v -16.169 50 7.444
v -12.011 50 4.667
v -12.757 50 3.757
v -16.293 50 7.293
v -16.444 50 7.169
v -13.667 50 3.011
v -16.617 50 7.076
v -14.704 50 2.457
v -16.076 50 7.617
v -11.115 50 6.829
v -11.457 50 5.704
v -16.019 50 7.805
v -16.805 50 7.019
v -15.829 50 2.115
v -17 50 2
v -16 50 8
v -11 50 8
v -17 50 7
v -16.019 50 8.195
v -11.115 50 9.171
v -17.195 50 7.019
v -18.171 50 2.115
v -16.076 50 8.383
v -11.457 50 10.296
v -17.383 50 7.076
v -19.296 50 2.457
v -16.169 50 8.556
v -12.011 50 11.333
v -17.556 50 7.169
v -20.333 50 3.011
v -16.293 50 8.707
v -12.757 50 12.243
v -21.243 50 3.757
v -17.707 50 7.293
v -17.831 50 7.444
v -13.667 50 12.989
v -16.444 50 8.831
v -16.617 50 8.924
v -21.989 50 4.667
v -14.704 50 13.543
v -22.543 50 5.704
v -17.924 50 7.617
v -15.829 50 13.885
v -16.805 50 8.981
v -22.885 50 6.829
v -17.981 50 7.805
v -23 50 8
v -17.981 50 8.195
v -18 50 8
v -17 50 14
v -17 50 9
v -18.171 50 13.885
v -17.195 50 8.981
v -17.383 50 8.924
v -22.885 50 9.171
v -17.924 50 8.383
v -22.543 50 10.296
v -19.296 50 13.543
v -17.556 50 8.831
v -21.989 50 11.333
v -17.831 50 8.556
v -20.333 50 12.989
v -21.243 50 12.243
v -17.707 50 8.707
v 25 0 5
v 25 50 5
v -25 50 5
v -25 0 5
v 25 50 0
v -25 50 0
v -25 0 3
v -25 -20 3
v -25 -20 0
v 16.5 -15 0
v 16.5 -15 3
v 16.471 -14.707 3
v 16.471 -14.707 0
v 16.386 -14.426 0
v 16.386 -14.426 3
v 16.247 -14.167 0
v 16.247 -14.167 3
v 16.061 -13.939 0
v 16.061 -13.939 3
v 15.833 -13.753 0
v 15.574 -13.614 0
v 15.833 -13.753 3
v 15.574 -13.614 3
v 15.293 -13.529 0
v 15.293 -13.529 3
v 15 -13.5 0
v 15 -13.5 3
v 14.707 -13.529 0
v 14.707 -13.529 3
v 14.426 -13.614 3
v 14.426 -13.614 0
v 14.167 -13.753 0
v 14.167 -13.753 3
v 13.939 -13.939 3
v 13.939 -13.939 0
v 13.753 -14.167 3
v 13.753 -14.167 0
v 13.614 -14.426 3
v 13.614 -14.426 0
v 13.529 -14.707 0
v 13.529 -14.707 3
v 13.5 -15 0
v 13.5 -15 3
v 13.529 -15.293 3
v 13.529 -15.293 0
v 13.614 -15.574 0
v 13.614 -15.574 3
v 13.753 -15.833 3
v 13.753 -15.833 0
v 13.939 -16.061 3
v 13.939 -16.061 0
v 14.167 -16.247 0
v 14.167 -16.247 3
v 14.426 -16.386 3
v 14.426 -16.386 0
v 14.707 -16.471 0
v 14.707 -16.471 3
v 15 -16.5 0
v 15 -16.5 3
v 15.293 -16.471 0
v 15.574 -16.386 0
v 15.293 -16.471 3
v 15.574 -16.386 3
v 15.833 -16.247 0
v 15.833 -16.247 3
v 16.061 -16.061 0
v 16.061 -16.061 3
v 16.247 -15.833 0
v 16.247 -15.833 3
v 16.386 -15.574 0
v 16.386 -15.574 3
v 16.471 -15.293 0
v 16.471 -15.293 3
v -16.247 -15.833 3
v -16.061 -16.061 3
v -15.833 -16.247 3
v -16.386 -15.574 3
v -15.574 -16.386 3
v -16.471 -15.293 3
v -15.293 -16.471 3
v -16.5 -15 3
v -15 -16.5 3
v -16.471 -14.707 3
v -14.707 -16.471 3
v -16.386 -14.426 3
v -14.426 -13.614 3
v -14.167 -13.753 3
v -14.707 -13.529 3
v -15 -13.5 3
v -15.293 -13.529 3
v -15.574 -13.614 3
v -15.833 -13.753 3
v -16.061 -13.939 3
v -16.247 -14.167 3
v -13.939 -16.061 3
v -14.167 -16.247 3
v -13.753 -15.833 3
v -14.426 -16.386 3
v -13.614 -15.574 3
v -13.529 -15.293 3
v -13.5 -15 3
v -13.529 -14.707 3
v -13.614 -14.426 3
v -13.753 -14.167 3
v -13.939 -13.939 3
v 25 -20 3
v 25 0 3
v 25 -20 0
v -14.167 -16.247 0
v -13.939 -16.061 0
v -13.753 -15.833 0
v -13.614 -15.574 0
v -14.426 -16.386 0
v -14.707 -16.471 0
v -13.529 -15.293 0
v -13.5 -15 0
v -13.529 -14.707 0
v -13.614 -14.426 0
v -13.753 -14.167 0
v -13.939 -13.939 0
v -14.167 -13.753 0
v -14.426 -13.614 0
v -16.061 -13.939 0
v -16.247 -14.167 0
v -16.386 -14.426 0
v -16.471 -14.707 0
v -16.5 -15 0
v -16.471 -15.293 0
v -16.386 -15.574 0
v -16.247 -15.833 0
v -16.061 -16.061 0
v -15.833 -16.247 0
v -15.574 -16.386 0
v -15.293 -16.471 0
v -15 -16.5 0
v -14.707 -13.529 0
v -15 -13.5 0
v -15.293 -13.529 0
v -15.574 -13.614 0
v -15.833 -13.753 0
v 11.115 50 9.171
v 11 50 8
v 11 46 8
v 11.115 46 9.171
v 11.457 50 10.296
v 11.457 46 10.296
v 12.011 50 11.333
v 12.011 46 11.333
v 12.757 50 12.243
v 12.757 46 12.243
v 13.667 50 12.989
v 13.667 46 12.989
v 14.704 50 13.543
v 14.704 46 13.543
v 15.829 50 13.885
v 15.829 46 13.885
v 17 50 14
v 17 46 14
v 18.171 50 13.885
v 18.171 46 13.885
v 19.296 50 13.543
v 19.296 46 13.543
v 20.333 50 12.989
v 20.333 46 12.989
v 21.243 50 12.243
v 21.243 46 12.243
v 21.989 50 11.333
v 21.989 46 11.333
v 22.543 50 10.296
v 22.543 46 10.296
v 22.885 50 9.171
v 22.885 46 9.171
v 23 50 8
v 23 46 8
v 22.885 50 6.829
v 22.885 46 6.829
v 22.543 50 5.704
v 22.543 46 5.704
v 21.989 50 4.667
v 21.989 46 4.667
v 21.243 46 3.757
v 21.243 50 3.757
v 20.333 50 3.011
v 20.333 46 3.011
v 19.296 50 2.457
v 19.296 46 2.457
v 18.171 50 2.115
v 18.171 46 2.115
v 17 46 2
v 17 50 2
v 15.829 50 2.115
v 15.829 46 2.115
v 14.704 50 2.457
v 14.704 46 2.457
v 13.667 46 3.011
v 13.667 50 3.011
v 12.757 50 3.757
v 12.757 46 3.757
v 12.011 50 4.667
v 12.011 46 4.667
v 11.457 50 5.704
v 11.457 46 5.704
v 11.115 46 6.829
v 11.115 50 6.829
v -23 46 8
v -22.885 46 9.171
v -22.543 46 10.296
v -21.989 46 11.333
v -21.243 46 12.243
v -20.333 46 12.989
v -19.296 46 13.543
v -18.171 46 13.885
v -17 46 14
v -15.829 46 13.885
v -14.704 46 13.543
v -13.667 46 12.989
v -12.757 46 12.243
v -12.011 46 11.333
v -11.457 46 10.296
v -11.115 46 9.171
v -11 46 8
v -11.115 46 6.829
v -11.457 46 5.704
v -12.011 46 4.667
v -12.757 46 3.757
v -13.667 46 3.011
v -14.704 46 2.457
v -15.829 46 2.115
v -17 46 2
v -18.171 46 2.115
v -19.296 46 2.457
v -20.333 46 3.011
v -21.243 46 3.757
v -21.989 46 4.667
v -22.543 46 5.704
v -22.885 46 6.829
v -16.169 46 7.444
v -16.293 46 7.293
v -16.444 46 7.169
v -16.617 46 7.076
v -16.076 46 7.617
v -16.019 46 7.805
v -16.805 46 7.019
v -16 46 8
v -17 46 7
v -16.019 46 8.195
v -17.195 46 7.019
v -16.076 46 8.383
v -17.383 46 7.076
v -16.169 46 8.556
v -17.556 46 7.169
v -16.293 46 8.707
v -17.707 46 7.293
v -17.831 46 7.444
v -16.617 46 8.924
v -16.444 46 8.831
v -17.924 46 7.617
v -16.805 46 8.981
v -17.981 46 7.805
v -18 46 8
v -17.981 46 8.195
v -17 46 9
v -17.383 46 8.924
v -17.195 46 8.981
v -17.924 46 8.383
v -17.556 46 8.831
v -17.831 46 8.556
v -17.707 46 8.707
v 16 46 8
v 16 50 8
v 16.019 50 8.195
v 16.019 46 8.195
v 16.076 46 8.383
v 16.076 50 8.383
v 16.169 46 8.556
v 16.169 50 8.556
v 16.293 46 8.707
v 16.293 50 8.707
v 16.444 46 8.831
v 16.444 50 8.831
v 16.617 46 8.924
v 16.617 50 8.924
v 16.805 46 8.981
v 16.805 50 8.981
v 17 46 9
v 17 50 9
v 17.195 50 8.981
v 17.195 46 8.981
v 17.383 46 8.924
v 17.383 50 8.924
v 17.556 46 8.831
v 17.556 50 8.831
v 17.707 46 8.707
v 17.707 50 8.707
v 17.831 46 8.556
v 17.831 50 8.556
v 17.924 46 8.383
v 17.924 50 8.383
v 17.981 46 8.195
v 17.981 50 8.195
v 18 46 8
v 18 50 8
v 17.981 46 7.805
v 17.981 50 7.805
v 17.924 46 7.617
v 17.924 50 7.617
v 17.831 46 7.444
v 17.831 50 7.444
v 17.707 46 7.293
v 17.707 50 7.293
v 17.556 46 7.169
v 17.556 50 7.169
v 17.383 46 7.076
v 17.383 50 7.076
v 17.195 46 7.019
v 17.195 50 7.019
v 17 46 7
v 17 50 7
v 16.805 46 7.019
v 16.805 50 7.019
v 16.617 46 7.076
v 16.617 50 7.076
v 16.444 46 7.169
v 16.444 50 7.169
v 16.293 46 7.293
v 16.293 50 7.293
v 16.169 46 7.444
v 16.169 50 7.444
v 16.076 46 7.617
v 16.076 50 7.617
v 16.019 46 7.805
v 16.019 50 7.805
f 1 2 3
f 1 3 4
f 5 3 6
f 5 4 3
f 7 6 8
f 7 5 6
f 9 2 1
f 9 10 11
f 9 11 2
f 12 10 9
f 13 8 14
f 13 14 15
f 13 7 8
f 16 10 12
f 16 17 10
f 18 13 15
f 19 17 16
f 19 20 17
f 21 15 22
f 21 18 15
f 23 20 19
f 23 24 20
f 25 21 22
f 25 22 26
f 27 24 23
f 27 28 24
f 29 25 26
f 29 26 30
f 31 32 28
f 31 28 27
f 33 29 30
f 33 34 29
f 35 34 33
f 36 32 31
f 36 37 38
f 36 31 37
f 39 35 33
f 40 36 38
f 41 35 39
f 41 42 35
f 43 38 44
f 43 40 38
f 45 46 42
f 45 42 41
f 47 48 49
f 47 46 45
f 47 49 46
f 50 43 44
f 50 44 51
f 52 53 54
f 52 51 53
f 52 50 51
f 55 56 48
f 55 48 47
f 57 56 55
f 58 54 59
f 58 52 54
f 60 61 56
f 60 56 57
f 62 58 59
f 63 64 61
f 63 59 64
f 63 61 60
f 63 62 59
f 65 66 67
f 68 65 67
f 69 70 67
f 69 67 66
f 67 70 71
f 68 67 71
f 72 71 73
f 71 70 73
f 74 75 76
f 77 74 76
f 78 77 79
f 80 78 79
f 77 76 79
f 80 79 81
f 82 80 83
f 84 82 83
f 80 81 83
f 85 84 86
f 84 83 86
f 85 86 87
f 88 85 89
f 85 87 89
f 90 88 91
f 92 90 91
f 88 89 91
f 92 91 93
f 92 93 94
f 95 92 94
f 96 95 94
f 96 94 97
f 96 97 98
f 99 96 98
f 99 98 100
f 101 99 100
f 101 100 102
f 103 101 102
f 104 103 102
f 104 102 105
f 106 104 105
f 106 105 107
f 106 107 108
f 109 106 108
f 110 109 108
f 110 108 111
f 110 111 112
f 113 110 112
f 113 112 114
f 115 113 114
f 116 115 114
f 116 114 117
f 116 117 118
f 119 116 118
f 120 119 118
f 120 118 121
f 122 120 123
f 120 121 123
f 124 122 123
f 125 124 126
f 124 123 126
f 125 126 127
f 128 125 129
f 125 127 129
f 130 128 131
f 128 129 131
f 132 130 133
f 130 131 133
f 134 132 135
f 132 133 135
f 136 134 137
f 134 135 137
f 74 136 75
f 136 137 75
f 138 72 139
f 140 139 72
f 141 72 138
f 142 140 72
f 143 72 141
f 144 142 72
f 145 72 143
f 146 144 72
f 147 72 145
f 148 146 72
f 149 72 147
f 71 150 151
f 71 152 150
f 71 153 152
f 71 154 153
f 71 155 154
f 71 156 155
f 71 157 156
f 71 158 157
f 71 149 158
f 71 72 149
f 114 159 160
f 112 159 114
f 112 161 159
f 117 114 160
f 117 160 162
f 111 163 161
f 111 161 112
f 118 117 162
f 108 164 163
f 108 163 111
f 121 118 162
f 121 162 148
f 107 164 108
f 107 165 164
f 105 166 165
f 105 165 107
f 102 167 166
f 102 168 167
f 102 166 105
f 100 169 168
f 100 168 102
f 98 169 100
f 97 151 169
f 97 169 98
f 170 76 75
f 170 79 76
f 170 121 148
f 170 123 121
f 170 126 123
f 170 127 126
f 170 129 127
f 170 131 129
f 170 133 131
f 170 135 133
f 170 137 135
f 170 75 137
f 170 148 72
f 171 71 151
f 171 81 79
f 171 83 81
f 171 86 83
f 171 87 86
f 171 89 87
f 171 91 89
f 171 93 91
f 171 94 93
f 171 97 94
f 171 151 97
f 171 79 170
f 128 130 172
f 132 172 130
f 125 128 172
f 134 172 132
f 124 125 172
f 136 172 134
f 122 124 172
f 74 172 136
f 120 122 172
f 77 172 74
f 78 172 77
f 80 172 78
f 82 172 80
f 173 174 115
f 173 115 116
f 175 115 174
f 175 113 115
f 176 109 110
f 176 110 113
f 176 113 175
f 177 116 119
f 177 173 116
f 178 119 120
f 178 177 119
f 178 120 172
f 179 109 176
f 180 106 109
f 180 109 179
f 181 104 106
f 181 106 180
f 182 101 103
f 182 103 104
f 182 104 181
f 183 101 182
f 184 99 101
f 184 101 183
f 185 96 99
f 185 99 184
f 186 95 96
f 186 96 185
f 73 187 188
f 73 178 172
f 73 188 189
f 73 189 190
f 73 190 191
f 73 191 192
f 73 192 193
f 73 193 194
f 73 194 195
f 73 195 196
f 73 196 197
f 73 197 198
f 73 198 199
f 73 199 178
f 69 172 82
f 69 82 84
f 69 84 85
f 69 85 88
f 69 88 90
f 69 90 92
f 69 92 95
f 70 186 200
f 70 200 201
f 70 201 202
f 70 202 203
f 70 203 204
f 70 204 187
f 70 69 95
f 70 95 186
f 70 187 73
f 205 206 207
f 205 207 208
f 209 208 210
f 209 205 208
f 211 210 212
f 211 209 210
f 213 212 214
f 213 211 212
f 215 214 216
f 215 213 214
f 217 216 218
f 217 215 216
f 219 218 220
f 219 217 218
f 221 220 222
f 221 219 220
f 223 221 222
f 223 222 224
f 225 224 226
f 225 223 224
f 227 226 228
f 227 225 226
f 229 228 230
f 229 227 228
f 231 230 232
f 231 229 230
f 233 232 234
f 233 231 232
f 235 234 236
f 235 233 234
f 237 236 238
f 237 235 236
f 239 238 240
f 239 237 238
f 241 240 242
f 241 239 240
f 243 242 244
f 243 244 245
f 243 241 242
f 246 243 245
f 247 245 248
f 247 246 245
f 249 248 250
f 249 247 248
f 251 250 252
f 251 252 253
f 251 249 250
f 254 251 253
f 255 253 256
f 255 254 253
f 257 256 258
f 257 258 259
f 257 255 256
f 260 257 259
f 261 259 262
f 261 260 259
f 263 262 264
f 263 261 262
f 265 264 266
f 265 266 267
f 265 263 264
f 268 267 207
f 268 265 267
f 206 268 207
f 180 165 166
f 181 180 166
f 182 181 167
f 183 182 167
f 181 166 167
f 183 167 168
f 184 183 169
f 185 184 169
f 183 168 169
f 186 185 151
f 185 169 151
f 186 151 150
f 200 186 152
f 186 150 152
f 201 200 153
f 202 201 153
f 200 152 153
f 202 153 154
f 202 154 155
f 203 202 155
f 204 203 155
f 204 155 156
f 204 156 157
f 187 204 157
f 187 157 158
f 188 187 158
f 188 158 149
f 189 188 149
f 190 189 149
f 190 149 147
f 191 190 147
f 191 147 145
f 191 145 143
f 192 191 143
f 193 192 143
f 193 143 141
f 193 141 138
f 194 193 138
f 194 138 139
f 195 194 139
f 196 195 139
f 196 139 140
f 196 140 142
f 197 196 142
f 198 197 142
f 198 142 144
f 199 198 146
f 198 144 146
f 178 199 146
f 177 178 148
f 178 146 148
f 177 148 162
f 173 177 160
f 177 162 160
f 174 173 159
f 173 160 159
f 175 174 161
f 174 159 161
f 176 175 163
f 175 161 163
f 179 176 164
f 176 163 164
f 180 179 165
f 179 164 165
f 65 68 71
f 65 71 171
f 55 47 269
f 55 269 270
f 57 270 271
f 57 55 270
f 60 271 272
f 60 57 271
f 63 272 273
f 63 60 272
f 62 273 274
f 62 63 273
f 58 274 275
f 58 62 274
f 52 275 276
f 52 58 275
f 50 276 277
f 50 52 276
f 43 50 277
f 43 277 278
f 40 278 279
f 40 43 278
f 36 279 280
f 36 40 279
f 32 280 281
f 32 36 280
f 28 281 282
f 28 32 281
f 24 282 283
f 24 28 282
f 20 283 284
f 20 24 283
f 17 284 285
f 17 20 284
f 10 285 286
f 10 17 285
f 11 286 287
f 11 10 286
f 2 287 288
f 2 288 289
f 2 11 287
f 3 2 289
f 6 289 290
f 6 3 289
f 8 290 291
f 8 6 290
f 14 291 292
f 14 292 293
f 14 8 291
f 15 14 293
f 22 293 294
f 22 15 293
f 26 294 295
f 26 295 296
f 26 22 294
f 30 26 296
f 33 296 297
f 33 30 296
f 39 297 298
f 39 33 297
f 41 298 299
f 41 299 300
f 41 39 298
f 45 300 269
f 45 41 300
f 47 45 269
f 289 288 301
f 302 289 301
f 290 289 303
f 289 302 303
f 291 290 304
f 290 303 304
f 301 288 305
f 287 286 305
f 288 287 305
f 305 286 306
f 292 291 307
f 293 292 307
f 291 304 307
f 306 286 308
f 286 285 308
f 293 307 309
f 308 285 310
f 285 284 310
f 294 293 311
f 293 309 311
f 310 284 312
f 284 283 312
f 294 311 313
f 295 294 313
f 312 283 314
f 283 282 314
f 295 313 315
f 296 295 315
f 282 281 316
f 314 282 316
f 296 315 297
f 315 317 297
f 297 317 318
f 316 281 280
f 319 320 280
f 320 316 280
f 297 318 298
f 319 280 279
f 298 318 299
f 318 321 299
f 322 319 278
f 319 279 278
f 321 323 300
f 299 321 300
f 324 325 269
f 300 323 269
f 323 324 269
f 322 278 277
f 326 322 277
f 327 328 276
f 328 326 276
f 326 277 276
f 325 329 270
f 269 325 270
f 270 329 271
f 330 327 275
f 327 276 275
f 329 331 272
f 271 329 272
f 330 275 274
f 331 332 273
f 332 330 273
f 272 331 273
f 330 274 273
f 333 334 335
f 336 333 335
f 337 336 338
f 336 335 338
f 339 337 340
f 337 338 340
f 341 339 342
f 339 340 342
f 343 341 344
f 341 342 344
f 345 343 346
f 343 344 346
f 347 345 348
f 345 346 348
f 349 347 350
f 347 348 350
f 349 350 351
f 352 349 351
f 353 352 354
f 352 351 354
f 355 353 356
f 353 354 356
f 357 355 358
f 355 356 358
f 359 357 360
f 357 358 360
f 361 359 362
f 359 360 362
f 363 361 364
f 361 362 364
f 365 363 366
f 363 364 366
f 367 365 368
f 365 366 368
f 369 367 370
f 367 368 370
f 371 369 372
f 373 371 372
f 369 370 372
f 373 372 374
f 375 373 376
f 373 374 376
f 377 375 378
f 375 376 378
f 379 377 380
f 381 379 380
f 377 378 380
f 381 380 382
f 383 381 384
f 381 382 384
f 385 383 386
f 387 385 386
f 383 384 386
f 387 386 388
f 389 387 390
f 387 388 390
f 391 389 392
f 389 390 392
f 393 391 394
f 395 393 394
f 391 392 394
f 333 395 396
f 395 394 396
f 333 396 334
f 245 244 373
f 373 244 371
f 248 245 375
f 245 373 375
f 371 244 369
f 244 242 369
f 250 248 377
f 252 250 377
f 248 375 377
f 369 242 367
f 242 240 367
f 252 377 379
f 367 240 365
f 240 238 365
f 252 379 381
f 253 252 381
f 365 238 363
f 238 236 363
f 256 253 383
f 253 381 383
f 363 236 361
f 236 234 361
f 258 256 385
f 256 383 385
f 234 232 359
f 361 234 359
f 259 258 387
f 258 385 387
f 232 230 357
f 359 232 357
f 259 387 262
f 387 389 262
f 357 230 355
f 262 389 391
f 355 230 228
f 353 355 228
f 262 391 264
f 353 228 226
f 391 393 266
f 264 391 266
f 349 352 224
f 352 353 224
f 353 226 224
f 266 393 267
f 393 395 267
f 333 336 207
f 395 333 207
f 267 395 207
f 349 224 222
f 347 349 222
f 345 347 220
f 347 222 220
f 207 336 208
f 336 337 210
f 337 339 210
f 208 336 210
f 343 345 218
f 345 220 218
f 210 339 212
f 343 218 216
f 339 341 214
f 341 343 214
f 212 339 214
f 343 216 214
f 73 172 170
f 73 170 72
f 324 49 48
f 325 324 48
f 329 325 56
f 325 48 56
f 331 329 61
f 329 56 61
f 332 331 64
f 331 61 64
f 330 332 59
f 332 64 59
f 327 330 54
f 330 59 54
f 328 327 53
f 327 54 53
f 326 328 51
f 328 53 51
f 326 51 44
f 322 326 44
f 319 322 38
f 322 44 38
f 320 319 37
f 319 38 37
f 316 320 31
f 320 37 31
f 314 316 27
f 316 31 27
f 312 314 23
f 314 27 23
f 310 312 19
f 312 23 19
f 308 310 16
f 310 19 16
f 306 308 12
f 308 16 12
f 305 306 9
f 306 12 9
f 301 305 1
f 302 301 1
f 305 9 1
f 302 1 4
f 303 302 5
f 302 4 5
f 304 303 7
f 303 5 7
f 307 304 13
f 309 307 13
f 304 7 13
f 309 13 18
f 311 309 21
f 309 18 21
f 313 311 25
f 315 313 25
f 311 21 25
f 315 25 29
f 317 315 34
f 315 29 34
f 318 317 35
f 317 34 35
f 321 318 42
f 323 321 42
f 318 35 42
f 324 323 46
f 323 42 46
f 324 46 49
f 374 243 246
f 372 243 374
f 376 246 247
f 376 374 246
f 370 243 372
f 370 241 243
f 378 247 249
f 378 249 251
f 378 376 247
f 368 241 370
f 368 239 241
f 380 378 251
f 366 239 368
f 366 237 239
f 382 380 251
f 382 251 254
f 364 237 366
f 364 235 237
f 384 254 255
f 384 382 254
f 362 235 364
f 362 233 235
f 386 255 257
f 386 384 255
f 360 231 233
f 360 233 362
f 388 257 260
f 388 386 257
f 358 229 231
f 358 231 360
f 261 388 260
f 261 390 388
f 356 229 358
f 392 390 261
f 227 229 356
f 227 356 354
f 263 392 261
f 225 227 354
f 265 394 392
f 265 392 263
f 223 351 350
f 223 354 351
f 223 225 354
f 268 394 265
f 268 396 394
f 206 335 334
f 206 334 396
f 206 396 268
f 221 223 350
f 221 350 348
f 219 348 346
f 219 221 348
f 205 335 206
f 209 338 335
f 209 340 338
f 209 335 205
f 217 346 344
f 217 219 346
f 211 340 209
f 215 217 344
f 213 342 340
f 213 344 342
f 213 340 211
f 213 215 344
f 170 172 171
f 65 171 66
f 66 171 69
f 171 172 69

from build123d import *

# Parameters (mm, degrees)
PAD_DEPTH       = 5
SKETCH001_W     = 59.80002
SKETCH001_H     = 24.428946
POCKET_DEPTH    = 2
SKETCH002_R     = 1.5
POCKET001_DEPTH = 5
SKETCH004_R     = 6
SKETCH004_R_2   = 1
PAD001_DEPTH    = 4


with BuildPart() as pocket001:
    # Sketch → Pad (new body)
    with BuildSketch(Plane.XY):
        Polygon((-25, 50), (25, 50), (25, 0), (25, -20), (-25, -20), (-25, 0), align=None)
    extrude(amount=PAD_DEPTH)

    # Sketch001 → Pocket (cut)
    with BuildSketch(Plane.XY.offset(5)):
        with Locations((-0.254472, -12.214473)):
            Rectangle(SKETCH001_W, SKETCH001_H)
    extrude(amount=-POCKET_DEPTH, mode=Mode.SUBTRACT)

    # Sketch002 → Pocket001 (cut)
    with BuildSketch(Plane.XY.offset(3)):
        with Locations((-15, -15)):
            Circle(SKETCH002_R)
        with Locations((15, -15)):
            Circle(SKETCH002_R)
    extrude(amount=-POCKET001_DEPTH, mode=Mode.SUBTRACT)


with BuildPart() as pad001:
    # Sketch004 → Pad001 (new body)
    with BuildSketch(Plane(origin=(0, 50, 0), x_dir=(-1, 0, 0), z_dir=(0, 1, 0))):
        with Locations((-17, 8)):
            Circle(SKETCH004_R)
        with Locations((-17, 8)):
            Circle(SKETCH004_R_2, mode=Mode.SUBTRACT)
        with Locations((17, 8)):
            Circle(SKETCH004_R)
        with Locations((17, 8)):
            Circle(SKETCH004_R_2, mode=Mode.SUBTRACT)
    extrude(amount=-PAD001_DEPTH)


solid = Compound([pocket001.part, pad001.part])
